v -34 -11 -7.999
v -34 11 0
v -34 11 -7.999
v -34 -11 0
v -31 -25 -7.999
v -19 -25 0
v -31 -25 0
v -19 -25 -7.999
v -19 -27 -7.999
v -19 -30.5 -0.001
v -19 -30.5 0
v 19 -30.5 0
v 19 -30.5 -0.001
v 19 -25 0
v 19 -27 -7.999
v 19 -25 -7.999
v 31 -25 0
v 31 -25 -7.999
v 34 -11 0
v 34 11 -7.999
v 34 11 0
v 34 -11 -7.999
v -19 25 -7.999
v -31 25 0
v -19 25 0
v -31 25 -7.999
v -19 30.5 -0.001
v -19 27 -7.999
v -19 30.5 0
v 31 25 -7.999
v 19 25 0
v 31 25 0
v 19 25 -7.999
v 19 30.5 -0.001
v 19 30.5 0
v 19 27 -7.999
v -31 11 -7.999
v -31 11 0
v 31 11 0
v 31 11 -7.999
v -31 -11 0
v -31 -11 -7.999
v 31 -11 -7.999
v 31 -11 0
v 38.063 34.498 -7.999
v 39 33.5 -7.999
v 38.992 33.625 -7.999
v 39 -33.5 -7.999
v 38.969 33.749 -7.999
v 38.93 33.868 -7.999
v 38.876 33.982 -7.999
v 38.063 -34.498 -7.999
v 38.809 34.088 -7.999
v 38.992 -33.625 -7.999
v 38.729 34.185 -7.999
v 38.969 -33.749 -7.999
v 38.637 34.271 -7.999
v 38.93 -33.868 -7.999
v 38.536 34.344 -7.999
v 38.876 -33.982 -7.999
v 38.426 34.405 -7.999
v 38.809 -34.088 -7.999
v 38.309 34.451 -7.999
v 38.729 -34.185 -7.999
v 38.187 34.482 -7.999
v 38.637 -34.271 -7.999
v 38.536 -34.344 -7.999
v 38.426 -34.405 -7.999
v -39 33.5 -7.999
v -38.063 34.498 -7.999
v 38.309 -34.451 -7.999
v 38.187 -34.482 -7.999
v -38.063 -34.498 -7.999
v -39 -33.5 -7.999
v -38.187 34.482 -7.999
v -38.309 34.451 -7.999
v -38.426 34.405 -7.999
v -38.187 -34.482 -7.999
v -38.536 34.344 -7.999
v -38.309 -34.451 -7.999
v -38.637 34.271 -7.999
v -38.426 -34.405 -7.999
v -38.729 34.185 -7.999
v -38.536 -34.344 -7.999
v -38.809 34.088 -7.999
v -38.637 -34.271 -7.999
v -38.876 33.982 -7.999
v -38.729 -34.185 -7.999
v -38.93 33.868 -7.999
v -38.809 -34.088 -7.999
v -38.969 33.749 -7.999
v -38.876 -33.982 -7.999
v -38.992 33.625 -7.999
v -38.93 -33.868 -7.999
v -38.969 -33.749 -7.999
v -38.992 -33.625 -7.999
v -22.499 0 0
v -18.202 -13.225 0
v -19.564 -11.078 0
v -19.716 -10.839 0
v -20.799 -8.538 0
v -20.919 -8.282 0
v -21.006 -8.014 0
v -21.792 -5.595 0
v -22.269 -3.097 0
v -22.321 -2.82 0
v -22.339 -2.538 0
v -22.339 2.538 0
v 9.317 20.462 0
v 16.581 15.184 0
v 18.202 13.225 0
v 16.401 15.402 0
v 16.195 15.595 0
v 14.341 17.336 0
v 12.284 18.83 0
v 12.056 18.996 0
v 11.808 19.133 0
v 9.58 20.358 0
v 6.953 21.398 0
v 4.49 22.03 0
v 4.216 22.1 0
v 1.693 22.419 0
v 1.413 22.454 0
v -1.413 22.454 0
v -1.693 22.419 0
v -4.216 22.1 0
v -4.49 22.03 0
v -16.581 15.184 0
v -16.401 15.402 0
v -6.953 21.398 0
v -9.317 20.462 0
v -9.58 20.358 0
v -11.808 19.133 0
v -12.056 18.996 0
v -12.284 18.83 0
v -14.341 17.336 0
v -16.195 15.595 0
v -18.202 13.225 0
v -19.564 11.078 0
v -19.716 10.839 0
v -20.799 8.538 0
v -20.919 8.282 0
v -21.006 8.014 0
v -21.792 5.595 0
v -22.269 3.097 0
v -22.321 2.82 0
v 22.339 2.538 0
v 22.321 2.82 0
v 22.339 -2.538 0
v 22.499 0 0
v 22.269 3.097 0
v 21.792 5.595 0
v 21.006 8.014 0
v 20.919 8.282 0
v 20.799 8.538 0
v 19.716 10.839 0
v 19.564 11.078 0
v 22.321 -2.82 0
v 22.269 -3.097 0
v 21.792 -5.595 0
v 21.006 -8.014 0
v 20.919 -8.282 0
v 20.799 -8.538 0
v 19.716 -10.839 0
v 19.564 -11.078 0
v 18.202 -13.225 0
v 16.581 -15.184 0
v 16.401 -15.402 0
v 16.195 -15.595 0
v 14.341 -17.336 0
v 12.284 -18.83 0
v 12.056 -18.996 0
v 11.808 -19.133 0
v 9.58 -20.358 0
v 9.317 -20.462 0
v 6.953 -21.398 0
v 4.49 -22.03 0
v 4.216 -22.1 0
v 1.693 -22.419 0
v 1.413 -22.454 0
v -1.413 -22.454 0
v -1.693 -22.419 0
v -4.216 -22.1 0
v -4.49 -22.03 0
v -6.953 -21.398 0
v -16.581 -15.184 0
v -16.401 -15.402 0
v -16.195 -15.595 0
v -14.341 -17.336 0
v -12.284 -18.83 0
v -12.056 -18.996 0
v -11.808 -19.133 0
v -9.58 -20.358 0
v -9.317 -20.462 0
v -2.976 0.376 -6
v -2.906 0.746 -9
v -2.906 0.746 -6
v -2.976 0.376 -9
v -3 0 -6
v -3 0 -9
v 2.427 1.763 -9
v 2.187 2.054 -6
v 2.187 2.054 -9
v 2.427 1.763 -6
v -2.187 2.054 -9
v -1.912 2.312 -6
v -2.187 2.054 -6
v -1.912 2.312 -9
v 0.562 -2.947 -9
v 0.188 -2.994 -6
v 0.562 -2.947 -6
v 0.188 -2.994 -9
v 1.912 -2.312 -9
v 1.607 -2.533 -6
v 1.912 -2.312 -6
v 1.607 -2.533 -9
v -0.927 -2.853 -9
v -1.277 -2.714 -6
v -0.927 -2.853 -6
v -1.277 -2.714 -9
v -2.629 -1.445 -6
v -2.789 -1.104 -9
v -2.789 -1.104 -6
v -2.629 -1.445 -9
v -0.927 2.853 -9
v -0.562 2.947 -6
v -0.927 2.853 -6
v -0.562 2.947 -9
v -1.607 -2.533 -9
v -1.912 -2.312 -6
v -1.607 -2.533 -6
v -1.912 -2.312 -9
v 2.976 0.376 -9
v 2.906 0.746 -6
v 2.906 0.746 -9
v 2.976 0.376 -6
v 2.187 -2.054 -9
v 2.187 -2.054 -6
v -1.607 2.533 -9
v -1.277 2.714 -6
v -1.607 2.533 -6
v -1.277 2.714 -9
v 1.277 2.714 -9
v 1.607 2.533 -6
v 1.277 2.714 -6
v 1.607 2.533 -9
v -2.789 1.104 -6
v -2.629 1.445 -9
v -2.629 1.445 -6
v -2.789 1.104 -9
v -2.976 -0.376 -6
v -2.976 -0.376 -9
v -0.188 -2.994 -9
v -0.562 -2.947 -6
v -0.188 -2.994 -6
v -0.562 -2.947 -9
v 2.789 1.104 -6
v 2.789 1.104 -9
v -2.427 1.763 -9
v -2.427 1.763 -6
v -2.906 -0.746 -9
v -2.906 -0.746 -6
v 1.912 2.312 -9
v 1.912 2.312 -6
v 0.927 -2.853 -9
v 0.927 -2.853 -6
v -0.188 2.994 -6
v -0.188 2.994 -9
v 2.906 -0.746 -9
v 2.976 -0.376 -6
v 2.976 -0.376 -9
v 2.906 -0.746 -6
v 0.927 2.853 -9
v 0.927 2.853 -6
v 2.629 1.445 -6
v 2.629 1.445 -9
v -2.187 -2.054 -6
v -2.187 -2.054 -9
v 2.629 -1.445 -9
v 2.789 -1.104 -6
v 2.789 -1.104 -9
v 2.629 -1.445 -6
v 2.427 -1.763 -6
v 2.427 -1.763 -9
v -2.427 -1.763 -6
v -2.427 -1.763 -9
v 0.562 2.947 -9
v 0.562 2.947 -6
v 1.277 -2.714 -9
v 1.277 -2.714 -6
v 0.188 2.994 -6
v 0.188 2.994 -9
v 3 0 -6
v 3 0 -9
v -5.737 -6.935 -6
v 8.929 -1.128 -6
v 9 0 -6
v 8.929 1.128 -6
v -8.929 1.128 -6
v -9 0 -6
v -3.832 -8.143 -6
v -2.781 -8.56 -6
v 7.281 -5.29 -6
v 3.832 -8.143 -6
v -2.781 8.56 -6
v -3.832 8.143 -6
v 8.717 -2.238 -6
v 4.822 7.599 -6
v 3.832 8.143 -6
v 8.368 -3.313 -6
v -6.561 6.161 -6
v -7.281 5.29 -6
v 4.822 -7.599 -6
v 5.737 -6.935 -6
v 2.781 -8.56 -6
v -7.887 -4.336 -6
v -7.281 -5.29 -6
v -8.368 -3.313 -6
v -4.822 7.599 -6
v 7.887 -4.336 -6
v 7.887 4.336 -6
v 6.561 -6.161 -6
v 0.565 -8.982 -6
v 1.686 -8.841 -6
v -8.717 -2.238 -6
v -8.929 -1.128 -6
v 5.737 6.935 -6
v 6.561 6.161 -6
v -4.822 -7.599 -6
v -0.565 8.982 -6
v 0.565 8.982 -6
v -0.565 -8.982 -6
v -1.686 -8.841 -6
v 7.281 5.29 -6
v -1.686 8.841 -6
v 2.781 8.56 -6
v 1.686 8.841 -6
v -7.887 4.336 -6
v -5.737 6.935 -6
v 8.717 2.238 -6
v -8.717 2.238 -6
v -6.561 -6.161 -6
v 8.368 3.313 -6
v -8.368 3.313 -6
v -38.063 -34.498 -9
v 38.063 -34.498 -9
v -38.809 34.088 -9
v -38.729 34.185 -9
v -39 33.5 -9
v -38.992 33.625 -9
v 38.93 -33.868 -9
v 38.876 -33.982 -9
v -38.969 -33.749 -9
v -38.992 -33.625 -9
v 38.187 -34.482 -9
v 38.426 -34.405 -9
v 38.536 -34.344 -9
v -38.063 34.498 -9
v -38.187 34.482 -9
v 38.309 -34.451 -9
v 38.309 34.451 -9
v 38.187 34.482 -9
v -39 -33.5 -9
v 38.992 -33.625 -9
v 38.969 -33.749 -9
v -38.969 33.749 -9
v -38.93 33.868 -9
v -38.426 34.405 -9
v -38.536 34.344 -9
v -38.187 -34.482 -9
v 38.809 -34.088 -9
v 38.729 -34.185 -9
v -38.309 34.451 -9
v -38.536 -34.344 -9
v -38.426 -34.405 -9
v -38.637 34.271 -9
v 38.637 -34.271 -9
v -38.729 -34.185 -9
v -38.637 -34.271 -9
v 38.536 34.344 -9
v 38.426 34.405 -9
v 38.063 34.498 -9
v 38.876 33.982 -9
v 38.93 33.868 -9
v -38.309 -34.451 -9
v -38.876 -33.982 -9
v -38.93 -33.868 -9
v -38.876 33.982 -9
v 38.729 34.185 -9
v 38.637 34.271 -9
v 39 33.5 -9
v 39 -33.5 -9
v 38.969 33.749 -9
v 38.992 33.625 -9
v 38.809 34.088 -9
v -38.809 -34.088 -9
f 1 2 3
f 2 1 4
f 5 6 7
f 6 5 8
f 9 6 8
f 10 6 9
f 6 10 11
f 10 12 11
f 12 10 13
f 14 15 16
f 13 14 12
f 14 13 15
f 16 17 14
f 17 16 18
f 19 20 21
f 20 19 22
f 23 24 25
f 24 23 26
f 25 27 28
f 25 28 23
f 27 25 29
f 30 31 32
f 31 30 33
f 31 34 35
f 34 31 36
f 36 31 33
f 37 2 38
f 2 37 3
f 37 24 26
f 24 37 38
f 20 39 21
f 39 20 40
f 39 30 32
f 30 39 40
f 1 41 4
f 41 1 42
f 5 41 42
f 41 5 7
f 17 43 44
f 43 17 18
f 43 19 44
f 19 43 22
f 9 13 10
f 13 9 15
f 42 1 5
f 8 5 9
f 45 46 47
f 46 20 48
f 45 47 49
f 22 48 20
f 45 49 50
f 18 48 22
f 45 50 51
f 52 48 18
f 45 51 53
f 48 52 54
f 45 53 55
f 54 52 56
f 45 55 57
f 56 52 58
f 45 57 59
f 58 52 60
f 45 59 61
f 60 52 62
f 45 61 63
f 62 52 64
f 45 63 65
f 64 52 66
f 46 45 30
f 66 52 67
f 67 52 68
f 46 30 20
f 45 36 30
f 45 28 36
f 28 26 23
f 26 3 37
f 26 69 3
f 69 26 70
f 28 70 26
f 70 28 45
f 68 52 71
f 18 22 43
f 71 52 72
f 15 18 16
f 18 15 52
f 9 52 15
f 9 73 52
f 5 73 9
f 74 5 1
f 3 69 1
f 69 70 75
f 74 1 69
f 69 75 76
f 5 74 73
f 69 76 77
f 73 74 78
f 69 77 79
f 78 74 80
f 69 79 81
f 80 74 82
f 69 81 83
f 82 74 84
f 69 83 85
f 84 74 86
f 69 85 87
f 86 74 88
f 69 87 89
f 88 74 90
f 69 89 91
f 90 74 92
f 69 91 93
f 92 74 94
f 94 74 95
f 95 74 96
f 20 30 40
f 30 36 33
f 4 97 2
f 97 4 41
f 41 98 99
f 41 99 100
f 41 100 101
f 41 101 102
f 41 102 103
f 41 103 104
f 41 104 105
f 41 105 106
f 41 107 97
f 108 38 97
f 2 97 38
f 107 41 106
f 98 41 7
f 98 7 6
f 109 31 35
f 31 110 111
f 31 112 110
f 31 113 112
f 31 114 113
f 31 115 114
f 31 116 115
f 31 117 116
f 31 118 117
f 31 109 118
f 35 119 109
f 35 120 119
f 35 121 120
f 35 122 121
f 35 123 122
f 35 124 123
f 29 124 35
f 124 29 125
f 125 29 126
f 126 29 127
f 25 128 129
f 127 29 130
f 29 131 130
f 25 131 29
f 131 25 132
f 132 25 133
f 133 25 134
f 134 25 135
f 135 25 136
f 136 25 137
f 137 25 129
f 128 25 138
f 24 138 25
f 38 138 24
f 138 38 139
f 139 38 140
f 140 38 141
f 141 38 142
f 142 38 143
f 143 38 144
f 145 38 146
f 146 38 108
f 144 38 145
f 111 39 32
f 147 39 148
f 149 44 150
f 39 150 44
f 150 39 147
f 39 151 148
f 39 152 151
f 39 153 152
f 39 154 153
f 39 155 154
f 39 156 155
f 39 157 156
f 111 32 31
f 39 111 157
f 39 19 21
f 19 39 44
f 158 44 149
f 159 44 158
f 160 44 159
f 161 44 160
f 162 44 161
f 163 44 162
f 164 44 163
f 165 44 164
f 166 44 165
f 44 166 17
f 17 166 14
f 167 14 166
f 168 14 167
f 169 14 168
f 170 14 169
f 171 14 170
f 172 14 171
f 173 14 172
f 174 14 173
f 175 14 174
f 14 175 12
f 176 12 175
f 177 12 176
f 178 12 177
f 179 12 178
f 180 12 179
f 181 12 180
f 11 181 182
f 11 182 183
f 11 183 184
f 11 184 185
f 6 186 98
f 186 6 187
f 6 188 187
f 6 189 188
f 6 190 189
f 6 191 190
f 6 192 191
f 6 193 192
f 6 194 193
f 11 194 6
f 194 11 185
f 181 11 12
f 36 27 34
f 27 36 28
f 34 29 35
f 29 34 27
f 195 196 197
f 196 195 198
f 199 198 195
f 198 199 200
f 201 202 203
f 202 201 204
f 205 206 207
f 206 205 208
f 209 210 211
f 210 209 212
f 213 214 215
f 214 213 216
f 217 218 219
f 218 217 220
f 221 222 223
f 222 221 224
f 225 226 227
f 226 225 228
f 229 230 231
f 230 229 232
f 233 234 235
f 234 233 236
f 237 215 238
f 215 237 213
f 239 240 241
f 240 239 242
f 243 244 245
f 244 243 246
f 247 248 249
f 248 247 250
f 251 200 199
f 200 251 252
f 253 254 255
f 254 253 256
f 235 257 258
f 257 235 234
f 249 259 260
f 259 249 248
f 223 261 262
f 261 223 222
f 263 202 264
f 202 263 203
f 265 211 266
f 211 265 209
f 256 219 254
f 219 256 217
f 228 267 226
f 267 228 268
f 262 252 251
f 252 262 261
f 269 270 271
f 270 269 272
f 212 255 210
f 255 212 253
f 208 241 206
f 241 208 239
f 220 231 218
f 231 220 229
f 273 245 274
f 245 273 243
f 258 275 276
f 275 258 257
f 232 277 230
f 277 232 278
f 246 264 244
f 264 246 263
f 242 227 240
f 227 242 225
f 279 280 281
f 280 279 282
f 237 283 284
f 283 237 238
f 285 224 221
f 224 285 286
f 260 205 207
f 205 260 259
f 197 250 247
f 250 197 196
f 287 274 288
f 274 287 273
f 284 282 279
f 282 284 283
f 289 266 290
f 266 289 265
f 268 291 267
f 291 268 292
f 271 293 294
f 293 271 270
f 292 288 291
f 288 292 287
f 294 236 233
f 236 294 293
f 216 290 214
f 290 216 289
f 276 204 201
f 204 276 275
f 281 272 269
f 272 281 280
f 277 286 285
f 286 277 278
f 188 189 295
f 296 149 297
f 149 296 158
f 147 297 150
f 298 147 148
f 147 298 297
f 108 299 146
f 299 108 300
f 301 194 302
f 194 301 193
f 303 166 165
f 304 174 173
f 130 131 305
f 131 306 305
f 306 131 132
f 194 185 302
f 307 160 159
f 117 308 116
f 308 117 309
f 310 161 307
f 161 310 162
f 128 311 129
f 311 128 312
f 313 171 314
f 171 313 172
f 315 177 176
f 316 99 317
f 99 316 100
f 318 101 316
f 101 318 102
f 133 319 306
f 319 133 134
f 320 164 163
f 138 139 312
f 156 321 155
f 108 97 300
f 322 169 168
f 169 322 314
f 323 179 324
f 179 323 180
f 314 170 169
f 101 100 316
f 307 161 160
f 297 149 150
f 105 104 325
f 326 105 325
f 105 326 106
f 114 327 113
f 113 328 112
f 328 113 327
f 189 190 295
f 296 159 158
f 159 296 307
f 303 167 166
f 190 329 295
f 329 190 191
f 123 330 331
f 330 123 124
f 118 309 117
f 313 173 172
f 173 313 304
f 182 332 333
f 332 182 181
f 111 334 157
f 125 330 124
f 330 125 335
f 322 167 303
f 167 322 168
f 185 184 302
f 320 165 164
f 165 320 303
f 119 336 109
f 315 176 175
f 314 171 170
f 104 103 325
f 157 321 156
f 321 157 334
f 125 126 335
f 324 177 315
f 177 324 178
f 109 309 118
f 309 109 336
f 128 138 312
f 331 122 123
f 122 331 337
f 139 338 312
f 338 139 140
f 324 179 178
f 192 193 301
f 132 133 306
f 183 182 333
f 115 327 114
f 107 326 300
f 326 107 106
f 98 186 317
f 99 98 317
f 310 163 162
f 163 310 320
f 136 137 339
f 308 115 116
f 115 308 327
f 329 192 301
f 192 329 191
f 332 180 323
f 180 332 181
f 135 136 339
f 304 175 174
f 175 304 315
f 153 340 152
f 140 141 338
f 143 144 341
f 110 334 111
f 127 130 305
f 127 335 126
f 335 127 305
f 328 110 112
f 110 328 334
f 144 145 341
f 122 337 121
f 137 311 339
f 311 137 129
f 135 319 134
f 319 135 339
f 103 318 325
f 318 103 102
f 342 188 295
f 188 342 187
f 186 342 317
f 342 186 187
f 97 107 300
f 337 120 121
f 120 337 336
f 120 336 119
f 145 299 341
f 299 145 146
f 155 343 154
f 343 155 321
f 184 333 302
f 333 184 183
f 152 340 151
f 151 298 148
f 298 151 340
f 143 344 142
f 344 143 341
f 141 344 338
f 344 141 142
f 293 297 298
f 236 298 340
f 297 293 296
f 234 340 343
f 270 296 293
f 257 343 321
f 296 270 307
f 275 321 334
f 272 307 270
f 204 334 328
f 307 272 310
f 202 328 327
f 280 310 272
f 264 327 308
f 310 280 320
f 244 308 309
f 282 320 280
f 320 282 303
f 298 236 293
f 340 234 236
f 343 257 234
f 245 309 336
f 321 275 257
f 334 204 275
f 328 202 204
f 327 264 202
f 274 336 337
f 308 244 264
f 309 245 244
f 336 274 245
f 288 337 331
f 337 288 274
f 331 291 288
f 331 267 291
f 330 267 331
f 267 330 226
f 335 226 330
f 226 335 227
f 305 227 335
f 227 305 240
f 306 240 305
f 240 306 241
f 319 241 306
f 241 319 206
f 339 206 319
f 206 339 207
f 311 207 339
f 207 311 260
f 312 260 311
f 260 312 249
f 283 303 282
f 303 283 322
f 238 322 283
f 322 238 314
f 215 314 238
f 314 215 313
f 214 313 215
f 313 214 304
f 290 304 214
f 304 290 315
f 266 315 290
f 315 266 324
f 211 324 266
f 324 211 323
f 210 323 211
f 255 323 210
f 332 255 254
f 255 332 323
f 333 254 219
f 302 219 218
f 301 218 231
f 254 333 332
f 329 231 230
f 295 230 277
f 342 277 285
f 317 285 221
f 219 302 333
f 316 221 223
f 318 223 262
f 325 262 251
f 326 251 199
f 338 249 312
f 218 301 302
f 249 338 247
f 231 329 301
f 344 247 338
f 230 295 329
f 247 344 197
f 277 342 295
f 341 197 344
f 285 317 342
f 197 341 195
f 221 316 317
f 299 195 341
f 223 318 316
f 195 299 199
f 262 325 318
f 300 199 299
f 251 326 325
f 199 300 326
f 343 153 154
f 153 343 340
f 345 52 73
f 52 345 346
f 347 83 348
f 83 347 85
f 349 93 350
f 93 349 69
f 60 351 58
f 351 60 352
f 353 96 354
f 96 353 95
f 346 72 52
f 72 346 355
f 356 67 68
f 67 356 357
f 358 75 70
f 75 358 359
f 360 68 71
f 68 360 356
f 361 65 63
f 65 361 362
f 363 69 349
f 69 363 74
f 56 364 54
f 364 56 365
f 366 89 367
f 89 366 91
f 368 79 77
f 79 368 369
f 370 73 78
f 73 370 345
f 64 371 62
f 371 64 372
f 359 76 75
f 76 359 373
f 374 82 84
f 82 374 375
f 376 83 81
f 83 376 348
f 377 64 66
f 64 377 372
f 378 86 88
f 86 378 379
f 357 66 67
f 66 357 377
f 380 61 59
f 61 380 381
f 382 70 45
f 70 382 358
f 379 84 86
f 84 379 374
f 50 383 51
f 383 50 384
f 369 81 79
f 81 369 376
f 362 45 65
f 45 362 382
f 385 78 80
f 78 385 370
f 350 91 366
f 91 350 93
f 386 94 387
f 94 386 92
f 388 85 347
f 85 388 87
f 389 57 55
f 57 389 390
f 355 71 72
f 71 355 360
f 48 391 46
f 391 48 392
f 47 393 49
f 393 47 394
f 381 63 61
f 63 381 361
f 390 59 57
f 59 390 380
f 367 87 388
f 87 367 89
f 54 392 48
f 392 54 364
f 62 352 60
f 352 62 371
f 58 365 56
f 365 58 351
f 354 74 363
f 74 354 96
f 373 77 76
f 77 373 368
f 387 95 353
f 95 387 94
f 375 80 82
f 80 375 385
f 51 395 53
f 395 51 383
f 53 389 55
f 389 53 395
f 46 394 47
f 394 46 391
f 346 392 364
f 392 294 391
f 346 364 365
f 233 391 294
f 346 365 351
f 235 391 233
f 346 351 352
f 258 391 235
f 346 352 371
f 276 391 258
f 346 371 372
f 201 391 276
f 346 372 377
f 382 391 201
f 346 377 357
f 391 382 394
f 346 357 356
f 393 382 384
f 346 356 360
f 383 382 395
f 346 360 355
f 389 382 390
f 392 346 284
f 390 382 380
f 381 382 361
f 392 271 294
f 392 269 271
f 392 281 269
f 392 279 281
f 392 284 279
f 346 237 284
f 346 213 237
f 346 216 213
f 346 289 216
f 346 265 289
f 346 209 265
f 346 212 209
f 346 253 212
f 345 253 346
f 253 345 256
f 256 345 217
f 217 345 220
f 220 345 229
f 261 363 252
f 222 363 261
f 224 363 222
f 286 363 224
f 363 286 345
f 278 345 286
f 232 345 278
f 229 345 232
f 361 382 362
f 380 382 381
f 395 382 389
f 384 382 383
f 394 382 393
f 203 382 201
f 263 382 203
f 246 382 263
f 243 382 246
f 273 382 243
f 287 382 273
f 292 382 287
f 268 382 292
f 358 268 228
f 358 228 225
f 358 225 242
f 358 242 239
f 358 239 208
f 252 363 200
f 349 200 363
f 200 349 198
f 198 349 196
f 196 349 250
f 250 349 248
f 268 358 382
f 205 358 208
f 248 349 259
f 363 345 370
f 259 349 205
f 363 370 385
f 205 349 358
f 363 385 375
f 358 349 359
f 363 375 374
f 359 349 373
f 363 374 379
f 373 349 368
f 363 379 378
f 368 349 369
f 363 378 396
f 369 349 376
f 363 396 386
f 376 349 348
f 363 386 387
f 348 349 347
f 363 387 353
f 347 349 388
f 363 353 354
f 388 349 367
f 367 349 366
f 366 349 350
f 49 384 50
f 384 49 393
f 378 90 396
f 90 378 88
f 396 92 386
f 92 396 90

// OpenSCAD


//How wide the clip part is flat side to flat side
ShoeBottomWidth = 68;
// The widest part of the angle
ShoeBottomLength = 61; 
//How wide the clip part is flat side to flat side
ShoeTopWidth = 68;
// The narrowest part of the angle
ShoeTopLength = 54; 
// How tall the shoe part is
ShoeDepth = 8;

// How long any 'keying' is on the front/back face of the shoe
FrontDetentLength = 15;
// How wide any 'keying' is on the front/back face of the shoe
FrontDetentWidth = 2;

// How long any 'keying' is on the side of the shoe
SideDetentLength = 16;
// How wide any 'keying' is on the side of the shoe
SideDetentWidth = 3;

TopPlateWidth = 78;
TopPlateLength = 69;
TopPlateDepth = 1;

$fn=50 + 0;

rotate(a=[0,180,0])
{
	difference()
	{
		shoe();
		shoekeys();
		cylinder(h = ShoeDepth, r=3);
		rotate(a=[0,180,0]) translate([0,0,2-ShoeDepth]) cylinder(h = ShoeDepth, r1 = 9, r2 = min(ShoeBottomWidth, ShoeBottomLength, ShoeTopWidth, ShoeTopLength) * .5);
	
	}
	
	// Face Plate
	difference()
	{
		minkowski()
		{
			translate([0,0, ShoeDepth]) cube(size = [TopPlateWidth - TopPlateDepth- TopPlateDepth,TopPlateLength - TopPlateDepth - TopPlateDepth,.001], center = true);
		 	cylinder(r=TopPlateDepth,h=TopPlateDepth);
		}
		translate([0,0, TopPlateDepth * 2]) cylinder(h = ShoeDepth, r=3);
	}
}



module shoe() {
	hull() {
		translate([0,0, .001]) cube(size = [ShoeBottomWidth,ShoeBottomLength,.001], center = true);
 		translate([0,0,ShoeDepth-.001]) cube(size = [ShoeTopWidth,ShoeTopLength,.001], center = true);
	}
}

module shoekeys()
{

	//Front and back keys
	hull()
	{	
		translate([(ShoeTopWidth * .5) - FrontDetentLength, (ShoeTopLength * .5) - ShoeTopLength, 0]) cube(size = [FrontDetentLength,FrontDetentWidth,ShoeDepth], center = false);
		translate([(ShoeBottomWidth * .5) - FrontDetentLength, -(ShoeBottomLength * .5) , 0]) cube(size = [FrontDetentLength,FrontDetentWidth,ShoeDepth], center = false);
	}
	hull()
	{	
		translate([-(ShoeTopWidth * .5) , (ShoeTopLength * .5) - ShoeTopLength, 0]) cube(size = [FrontDetentLength,FrontDetentWidth,ShoeDepth], center = false);
		translate([-(ShoeBottomWidth * .5) , -(ShoeBottomLength * .5) , 0]) cube(size = [FrontDetentLength,FrontDetentWidth,ShoeDepth], center = false);
	}

	hull()
	{	
		translate([(ShoeTopWidth * .5) - FrontDetentLength, (ShoeTopLength * .5) -FrontDetentWidth, 0]) cube(size = [FrontDetentLength,FrontDetentWidth,ShoeDepth], center = false);
		translate([(ShoeBottomWidth * .5) - FrontDetentLength, (ShoeBottomLength * .5) , 0]) cube(size = [FrontDetentLength,FrontDetentWidth,ShoeDepth], center = false);
	}
	hull()
	{	
		translate([-(ShoeTopWidth * .5) , (ShoeTopLength * .5) -FrontDetentWidth, 0]) cube(size = [FrontDetentLength,FrontDetentWidth,ShoeDepth], center = false);
		translate([-(ShoeBottomWidth * .5) , (ShoeBottomLength * .5) , 0]) cube(size = [FrontDetentLength,FrontDetentWidth,ShoeDepth], center = false);
	}

	// Side Keys
	hull()
	{
		translate([(ShoeTopWidth * .5) - SideDetentWidth , (ShoeTopLength * .5) - SideDetentLength, 0]) cube(size = [SideDetentWidth,SideDetentLength,ShoeDepth], center = false);
		translate([(ShoeBottomWidth * .5) - SideDetentWidth , (ShoeBottomLength * .5) - SideDetentLength, 0]) cube(size = [SideDetentWidth,SideDetentLength,ShoeDepth], center = false);
	}
	hull()
	{
	translate([-(ShoeTopWidth * .5)  , (ShoeTopLength * .5) - SideDetentLength, 0]) cube(size = [SideDetentWidth,SideDetentLength,ShoeDepth], center = false);
		translate([-(ShoeBottomWidth * .5)  , (ShoeBottomLength * .5) - SideDetentLength, 0]) cube(size = [SideDetentWidth,SideDetentLength,ShoeDepth], center = false);
	}
	hull()
	{
		translate([(ShoeTopWidth * .5) - SideDetentWidth , -(ShoeTopLength * .5), 0]) cube(size = [SideDetentWidth,SideDetentLength,ShoeDepth], center = false);
		translate([(ShoeBottomWidth * .5) - SideDetentWidth , -(ShoeBottomLength * .5), 0]) cube(size = [SideDetentWidth,SideDetentLength,ShoeDepth], center = false);
	}
	hull()
	{
	translate([-(ShoeTopWidth * .5)  , -(ShoeTopLength * .5) , 0]) cube(size = [SideDetentWidth,SideDetentLength,ShoeDepth], center = false);
		translate([-(ShoeBottomWidth * .5)  , -(ShoeBottomLength * .5) , 0]) cube(size = [SideDetentWidth,SideDetentLength,ShoeDepth], center = false);
	}
}
